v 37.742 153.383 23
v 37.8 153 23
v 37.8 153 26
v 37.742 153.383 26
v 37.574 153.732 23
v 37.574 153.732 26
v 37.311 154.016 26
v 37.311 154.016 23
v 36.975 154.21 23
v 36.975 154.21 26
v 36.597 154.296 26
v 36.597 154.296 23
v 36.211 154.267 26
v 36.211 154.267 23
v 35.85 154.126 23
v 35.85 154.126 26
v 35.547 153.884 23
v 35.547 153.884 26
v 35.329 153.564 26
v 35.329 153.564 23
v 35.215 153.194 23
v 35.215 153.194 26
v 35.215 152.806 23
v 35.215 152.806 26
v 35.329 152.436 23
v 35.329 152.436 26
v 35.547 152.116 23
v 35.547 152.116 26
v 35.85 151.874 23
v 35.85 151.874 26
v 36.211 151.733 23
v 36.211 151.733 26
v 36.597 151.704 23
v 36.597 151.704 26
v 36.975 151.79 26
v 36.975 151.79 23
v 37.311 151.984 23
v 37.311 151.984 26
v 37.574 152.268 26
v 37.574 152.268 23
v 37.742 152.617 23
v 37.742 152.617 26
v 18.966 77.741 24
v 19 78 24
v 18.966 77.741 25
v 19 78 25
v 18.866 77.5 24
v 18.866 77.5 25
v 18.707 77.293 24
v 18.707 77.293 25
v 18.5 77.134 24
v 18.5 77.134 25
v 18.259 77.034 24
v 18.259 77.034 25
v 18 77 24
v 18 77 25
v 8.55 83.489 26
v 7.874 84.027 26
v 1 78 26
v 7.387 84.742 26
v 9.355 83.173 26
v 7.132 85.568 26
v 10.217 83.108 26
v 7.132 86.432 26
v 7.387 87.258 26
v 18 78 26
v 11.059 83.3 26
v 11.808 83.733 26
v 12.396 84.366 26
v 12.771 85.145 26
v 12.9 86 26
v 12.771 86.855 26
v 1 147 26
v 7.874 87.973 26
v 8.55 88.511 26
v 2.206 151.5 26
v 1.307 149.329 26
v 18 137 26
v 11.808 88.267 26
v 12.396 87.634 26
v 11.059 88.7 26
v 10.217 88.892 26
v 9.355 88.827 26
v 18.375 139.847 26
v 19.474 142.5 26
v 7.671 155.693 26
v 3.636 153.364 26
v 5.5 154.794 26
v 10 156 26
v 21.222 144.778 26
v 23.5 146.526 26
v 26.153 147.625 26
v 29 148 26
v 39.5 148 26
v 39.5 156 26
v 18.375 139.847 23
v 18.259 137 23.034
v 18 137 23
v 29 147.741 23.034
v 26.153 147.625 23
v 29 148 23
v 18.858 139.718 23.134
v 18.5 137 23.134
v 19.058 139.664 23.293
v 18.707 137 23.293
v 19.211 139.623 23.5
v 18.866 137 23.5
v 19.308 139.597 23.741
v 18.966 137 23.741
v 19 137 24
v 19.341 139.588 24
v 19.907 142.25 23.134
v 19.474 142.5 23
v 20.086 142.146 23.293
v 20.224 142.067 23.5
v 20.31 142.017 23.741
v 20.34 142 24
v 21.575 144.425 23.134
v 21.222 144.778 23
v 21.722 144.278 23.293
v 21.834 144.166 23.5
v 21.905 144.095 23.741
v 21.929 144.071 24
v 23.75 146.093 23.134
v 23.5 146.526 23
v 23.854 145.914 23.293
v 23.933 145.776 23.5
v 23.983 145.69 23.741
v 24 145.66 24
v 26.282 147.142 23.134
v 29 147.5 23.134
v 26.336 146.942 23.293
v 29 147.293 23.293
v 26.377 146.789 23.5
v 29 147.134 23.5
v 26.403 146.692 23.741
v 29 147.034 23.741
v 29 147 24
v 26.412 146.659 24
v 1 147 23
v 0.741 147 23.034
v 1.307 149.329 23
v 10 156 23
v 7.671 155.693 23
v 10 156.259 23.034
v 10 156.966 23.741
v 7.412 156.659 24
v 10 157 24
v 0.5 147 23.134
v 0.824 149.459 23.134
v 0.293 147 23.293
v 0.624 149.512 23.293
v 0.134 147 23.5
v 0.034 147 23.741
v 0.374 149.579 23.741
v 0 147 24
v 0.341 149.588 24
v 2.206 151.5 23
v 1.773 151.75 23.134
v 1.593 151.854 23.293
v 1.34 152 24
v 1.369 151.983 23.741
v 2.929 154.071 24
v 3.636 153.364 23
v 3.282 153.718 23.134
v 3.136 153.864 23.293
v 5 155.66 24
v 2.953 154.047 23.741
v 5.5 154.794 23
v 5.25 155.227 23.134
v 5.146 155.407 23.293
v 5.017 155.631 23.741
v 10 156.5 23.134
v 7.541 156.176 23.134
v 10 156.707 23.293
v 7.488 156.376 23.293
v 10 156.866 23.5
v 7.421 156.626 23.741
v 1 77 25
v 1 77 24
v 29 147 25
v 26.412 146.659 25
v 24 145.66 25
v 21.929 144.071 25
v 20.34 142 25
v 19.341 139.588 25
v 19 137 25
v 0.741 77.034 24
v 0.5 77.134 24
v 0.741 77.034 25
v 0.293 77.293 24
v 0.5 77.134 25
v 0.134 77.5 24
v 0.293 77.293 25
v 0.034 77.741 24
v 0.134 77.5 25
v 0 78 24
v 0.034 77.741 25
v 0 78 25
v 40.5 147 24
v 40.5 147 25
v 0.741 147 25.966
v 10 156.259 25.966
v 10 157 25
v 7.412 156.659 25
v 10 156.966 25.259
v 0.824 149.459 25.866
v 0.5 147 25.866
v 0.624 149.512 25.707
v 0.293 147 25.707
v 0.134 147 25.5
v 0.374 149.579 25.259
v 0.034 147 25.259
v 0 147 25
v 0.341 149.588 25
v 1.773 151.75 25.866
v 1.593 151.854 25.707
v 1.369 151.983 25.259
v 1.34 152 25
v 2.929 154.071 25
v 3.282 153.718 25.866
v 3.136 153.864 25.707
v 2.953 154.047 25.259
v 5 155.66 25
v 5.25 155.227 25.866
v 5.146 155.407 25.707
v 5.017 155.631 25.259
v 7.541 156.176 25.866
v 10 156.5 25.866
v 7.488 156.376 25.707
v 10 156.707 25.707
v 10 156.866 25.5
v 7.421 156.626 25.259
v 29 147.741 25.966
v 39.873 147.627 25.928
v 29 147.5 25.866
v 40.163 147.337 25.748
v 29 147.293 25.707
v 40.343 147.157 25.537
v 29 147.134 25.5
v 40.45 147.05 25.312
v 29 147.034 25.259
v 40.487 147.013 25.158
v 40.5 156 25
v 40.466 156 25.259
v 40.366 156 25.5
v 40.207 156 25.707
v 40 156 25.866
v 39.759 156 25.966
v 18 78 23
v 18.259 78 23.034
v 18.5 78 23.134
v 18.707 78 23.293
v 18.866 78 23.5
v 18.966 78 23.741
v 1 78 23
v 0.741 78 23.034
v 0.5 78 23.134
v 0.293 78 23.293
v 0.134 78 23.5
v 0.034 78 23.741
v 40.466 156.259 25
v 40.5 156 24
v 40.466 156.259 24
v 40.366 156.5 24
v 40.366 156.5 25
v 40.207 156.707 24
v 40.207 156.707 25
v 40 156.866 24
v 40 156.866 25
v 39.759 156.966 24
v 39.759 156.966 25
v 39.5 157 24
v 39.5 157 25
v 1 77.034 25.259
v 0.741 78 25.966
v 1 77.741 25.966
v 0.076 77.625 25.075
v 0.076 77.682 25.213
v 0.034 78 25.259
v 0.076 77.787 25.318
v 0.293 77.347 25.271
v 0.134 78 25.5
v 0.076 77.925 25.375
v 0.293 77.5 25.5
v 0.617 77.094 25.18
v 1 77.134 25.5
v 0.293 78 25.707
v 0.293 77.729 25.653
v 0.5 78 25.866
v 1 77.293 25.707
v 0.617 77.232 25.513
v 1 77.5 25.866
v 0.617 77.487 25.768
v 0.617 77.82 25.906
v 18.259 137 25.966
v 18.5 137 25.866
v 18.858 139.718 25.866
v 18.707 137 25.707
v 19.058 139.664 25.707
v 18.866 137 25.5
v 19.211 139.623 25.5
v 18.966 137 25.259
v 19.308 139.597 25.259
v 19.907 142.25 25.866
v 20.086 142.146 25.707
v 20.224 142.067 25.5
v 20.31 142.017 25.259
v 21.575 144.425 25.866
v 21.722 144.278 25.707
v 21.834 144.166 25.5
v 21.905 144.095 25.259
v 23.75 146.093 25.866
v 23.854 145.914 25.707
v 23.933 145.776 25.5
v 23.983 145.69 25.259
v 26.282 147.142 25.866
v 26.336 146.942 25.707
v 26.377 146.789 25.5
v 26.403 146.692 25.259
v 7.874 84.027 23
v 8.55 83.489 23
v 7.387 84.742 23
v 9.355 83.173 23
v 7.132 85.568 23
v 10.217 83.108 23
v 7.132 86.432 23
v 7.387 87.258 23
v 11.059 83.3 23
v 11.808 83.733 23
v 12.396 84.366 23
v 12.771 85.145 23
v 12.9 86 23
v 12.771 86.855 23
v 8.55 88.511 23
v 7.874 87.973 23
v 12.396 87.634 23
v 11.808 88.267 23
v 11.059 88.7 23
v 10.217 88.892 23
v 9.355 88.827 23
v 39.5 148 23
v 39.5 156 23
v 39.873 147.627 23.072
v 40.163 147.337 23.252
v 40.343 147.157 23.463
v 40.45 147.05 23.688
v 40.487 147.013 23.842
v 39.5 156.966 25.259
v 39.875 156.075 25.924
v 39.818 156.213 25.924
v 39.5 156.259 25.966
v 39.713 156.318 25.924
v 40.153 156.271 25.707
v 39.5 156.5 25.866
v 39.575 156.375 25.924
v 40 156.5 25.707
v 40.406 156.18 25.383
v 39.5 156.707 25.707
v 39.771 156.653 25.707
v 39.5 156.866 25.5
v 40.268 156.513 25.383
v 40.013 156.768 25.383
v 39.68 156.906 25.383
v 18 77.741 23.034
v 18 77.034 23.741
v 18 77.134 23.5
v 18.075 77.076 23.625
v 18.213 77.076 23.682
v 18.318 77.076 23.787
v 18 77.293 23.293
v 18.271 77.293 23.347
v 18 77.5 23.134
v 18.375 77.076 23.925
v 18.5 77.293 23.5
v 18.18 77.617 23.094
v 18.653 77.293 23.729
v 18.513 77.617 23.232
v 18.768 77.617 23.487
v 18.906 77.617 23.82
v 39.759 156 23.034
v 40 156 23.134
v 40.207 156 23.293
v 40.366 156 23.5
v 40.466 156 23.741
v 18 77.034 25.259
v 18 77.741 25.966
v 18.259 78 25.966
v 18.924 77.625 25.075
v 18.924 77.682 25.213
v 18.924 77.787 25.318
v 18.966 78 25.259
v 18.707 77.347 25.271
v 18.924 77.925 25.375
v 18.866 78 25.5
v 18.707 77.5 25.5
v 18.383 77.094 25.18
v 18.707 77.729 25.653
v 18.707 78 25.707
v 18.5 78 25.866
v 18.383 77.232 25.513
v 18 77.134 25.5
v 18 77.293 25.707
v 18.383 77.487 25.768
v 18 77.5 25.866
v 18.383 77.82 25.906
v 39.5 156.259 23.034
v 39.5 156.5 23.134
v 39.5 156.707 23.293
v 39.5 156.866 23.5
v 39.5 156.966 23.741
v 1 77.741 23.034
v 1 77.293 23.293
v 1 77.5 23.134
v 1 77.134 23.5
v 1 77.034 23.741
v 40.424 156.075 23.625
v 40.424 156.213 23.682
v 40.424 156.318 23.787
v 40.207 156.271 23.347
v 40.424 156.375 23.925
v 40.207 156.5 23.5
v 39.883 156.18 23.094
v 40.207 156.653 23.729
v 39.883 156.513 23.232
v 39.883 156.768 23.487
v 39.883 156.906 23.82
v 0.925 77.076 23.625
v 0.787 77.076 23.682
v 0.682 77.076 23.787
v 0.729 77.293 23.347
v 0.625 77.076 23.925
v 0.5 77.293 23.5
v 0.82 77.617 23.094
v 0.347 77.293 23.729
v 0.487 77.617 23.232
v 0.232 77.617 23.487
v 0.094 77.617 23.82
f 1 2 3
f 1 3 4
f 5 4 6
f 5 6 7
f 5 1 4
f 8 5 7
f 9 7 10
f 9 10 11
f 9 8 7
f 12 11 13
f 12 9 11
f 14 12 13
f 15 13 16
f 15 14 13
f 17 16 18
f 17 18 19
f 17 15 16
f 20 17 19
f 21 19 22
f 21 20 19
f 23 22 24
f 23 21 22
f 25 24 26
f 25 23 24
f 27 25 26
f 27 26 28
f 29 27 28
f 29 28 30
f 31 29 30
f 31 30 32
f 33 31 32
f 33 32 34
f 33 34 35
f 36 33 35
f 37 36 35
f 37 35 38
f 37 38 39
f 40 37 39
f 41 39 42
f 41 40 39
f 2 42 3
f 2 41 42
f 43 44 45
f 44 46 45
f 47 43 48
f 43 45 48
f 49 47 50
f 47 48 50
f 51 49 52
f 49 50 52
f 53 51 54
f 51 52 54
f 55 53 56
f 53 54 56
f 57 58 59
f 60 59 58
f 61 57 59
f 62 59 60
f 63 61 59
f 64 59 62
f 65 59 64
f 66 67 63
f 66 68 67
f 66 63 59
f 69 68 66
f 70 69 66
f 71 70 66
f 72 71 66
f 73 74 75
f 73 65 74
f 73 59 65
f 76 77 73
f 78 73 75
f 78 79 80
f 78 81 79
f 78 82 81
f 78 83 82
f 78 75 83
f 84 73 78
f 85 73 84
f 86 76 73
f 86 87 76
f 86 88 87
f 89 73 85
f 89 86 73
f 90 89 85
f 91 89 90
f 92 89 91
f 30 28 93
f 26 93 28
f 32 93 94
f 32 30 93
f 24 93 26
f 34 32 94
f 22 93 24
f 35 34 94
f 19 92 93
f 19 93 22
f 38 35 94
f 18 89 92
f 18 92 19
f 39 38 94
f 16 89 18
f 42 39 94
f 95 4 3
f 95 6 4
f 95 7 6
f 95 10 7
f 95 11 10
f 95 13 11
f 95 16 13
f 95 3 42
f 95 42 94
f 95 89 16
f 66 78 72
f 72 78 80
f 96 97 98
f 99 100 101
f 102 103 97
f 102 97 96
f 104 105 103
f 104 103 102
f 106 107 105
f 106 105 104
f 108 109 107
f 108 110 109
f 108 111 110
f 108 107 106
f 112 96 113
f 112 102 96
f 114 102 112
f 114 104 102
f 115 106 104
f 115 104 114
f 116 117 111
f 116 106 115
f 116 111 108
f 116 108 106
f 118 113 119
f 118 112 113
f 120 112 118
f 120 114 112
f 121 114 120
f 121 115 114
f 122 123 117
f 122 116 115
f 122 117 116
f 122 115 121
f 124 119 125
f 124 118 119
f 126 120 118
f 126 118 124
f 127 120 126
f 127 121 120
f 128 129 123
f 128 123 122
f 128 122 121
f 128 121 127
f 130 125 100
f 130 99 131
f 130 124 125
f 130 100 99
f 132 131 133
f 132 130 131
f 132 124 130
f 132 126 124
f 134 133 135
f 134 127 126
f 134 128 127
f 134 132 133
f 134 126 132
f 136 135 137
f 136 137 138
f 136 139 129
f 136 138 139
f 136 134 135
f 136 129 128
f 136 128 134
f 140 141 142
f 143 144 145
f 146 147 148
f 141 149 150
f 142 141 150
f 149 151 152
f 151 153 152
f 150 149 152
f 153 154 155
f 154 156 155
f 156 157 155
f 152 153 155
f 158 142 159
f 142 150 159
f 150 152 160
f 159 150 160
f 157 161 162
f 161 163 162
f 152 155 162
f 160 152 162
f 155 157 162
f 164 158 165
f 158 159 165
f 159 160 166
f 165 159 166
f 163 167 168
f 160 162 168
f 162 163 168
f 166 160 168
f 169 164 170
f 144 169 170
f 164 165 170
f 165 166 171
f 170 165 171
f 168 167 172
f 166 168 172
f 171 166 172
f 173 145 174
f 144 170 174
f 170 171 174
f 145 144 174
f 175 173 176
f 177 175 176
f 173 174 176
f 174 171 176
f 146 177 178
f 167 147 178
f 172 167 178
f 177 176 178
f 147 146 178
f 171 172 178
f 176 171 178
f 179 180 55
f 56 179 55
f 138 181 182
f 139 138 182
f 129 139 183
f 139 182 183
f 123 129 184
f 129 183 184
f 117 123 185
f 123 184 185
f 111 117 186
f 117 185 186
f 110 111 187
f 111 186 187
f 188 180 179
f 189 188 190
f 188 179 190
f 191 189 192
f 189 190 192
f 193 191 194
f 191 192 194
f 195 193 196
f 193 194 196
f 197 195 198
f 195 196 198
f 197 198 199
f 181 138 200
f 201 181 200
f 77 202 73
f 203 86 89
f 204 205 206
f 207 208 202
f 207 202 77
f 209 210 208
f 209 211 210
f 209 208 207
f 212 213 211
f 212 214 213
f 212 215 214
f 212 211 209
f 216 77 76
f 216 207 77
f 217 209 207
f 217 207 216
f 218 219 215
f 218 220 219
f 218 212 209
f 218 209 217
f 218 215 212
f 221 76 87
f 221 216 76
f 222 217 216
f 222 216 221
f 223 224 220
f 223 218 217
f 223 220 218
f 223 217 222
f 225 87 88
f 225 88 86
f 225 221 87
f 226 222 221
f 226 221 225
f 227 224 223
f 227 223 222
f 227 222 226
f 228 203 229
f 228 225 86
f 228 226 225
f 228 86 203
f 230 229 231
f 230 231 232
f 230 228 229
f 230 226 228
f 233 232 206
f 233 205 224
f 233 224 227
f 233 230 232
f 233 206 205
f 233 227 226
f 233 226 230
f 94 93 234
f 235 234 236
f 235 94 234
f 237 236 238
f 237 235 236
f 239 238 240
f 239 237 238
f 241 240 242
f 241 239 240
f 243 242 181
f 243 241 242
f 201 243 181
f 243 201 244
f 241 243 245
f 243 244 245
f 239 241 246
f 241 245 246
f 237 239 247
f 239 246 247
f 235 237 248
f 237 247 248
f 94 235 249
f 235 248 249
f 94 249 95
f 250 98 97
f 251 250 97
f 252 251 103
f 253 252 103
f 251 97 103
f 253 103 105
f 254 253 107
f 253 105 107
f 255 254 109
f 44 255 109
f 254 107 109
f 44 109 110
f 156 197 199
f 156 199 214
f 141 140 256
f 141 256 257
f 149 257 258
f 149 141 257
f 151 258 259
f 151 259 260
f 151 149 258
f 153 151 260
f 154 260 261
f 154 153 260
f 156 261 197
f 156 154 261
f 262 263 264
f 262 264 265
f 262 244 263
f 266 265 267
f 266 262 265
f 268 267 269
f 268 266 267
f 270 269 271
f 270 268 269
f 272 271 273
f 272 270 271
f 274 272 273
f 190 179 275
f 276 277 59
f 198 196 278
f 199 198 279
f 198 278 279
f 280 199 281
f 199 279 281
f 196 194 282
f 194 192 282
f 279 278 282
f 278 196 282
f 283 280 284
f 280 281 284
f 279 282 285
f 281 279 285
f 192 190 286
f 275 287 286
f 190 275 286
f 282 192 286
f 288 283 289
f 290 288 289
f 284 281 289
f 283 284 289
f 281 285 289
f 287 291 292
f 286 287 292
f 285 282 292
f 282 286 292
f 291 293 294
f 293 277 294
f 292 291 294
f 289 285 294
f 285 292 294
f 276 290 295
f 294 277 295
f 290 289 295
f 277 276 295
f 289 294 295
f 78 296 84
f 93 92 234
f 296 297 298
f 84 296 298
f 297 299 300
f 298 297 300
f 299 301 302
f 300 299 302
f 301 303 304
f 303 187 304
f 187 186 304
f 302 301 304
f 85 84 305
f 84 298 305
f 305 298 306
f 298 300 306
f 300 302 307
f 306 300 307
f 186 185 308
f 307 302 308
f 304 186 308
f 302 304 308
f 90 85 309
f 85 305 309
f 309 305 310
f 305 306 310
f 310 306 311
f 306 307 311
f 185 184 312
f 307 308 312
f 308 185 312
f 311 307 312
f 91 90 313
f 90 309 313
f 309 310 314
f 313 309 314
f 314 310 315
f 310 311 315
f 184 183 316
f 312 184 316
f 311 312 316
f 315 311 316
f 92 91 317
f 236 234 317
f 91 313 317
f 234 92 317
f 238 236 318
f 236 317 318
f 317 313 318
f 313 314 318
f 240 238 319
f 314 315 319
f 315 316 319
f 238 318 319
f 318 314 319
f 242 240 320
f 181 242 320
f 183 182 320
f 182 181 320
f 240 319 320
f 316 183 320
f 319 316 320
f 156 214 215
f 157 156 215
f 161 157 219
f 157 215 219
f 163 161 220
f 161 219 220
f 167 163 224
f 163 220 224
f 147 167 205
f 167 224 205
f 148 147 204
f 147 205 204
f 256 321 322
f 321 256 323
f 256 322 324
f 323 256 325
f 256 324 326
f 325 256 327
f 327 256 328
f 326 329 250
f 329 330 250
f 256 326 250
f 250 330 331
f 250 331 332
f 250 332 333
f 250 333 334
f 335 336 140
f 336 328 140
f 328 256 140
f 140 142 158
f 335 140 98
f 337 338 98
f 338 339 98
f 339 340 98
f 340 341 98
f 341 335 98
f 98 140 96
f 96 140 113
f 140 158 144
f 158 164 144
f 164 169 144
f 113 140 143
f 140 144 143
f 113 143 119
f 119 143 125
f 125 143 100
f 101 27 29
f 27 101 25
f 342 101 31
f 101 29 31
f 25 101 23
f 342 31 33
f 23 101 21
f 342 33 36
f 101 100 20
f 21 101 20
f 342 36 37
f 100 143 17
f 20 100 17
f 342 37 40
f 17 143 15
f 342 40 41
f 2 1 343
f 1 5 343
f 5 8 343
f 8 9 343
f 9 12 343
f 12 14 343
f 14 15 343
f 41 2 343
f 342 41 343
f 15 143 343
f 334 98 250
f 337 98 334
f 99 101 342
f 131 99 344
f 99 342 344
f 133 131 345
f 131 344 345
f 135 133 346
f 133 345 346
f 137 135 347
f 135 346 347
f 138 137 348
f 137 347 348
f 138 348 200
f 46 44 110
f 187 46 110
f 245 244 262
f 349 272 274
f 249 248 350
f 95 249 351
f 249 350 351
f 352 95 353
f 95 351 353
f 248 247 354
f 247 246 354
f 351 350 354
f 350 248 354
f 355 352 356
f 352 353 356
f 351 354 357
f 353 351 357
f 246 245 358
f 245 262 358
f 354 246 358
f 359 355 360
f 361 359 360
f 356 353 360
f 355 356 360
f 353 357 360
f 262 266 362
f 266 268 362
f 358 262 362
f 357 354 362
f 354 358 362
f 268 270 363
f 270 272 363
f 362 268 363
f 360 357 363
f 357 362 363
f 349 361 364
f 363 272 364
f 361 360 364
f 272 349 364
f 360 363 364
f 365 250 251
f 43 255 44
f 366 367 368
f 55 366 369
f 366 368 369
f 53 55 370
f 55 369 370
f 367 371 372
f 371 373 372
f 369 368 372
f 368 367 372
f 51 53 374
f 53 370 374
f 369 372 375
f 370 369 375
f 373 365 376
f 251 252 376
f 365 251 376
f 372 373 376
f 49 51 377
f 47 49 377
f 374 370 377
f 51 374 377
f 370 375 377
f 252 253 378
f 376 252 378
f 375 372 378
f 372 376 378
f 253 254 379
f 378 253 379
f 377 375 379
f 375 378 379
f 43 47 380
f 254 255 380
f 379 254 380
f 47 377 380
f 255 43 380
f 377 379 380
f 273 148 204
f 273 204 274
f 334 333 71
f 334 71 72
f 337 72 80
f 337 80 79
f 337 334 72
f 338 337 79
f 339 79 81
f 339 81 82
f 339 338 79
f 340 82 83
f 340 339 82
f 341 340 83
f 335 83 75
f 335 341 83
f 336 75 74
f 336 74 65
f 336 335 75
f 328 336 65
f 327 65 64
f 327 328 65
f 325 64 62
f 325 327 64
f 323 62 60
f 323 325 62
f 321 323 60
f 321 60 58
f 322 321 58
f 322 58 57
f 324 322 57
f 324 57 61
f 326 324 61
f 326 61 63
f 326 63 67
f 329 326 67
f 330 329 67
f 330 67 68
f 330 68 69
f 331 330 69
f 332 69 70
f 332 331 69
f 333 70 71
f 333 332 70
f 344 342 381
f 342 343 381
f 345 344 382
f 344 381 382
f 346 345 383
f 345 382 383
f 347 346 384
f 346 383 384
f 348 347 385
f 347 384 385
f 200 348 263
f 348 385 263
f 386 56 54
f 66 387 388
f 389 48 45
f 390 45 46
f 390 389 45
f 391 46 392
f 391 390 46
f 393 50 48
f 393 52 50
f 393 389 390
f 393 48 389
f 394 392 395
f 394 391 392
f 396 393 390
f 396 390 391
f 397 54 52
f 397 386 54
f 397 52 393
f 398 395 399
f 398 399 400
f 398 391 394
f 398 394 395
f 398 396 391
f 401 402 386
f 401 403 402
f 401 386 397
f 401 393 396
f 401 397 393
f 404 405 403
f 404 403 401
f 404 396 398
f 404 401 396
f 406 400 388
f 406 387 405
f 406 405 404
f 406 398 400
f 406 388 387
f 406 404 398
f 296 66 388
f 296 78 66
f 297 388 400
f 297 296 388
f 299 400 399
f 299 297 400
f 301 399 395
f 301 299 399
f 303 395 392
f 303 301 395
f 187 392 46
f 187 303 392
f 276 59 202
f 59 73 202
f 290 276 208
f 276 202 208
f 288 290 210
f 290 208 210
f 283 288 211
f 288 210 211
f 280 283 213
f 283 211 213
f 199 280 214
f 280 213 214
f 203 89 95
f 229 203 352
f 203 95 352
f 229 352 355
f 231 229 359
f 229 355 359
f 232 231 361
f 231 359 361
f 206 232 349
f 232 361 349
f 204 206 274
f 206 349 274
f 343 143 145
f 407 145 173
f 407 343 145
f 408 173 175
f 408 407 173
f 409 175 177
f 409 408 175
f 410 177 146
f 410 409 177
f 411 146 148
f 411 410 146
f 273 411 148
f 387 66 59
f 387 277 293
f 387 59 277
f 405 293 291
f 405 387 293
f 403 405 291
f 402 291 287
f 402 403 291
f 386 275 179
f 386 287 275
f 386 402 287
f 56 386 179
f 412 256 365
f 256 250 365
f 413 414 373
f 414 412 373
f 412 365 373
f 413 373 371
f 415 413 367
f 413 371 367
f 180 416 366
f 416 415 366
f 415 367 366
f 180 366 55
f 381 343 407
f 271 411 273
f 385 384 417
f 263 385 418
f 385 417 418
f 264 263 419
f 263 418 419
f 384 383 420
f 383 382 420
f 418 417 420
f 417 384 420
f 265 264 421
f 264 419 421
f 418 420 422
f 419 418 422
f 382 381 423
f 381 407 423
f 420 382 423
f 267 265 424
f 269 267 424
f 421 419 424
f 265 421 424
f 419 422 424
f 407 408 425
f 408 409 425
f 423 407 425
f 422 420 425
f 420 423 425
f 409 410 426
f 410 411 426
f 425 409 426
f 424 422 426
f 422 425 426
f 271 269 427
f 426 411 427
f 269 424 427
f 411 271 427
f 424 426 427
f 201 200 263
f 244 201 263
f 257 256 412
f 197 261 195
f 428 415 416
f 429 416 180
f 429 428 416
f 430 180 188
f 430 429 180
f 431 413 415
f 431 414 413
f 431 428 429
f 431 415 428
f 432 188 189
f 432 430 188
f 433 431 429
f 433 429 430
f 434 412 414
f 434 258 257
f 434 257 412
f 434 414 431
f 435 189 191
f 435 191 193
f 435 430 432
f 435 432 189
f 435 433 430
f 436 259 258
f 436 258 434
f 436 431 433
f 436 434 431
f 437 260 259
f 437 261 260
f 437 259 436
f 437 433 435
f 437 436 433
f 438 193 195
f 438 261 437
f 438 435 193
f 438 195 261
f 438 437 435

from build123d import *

# Parameters (mm, degrees)
ESQUISSE1_W        = 19
ESQUISSE1_H        = 70
ESQUISSE1_R        = 2.9
ESQUISSE1_H_2      = 10
ESQUISSE1_W_2      = 21.5
ESQUISSE1_R_2      = 1.3
BOSS_EXTRU_1_DEPTH = 3
CONG_1_R           = 10
CONG_2_R           = 1


with BuildPart() as part:
    # Esquisse1 → Boss.-Extru.1 (new body)
    # profile 1 of 3: a face of its own
    with BuildSketch(Plane.XY.offset(23)):
        with Locations((9.5, 112)):
            Rectangle(ESQUISSE1_W, ESQUISSE1_H)
        with Locations((10, 86)):
            Circle(ESQUISSE1_R, mode=Mode.SUBTRACT)
    # profile 2 of 3: a face of its own
    with BuildSketch(Plane.XY.offset(23)):
        with Locations((9.5, 152)):
            Rectangle(ESQUISSE1_W, ESQUISSE1_H_2)
    # profile 3 of 3: a face of its own
    with BuildSketch(Plane.XY.offset(23)):
        with Locations((29.75, 152)):
            Rectangle(ESQUISSE1_W_2, ESQUISSE1_H_2)
        with Locations((36.5, 153)):
            Circle(ESQUISSE1_R_2, mode=Mode.SUBTRACT)
    extrude(amount=BOSS_EXTRU_1_DEPTH)

    # Congé1
    cong_1_edges = [part.edges().sort_by_distance(p)[0] for p in [
        (0, 157, 24.5),
        (19, 147, 24.5),
    ]]
    fillet(cong_1_edges, radius=CONG_1_R)

    # Congé2
    cong_2_edges = [part.edges().sort_by_distance(p)[0] for p in [
        (25.25, 157, 23),
        (40.5, 152, 23),
        (19, 107, 23),
        (9.5, 77, 23),
        (0, 112, 23),
        (9.5, 77, 26),
        (40.5, 157, 24.5),
        (19, 77, 24.5),
        (0, 77, 24.5),
        (19, 107, 26),
        (34.75, 147, 23),
        (34.75, 147, 26),
        (40.5, 152, 26),
        (2.928932188, 154.071067812, 23),
        (2.928932188, 154.071067812, 26),
        (25.25, 157, 26),
        (21.928932188, 144.071067812, 23),
        (21.928932188, 144.071067812, 26),
        (0, 112, 26),
    ]]
    fillet(cong_2_edges, radius=CONG_2_R)


solid = part.part
